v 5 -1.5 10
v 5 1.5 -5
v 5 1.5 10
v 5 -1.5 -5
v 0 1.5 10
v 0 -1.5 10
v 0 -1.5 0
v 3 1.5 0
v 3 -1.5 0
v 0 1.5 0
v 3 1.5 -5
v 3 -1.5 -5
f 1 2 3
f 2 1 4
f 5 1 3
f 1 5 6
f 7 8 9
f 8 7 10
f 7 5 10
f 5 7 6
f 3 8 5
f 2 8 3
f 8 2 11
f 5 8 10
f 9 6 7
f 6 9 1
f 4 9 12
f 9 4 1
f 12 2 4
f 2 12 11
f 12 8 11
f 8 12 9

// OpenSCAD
// file: config.scad
// all measures in mm

material_x = 510;
material_y = 370;
material_width = 3;

leg_x = 50;
leg_y = 40;
leg_z = 120;

// about hoch much the faces in Y direction are inset
face_y_inset = 5;

// how far the joint extends planarly from the face
joint_x = 5;
// the lateral width of the joint
joint_y = 10;
// how far down the hook extends
joint_hook_y = 5;

joint_total_height = joint_y + joint_hook_y;

num_joints = 3;
q = leg_z/4;
joint_height = [q, 2*q, 3*q];

// how far apart from on another to project the parts
projection_spacing = 1;

// rendering quality (face number)
$fn = 50;
// main file
include <config.scad>;

module joint()
{
    // center in y-direction
    translate([
        0,
        -material_width/2,
        0
        ])
    {
        // main support structure
        cube([
            joint_x,
            material_width,
            joint_y
            ]);

        // add hook
        translate([
            material_width,
            0,
            -joint_hook_y
            ])
            cube([
                joint_x - material_width,
                material_width,
                joint_hook_y
                ]);
    }
}

joint();
